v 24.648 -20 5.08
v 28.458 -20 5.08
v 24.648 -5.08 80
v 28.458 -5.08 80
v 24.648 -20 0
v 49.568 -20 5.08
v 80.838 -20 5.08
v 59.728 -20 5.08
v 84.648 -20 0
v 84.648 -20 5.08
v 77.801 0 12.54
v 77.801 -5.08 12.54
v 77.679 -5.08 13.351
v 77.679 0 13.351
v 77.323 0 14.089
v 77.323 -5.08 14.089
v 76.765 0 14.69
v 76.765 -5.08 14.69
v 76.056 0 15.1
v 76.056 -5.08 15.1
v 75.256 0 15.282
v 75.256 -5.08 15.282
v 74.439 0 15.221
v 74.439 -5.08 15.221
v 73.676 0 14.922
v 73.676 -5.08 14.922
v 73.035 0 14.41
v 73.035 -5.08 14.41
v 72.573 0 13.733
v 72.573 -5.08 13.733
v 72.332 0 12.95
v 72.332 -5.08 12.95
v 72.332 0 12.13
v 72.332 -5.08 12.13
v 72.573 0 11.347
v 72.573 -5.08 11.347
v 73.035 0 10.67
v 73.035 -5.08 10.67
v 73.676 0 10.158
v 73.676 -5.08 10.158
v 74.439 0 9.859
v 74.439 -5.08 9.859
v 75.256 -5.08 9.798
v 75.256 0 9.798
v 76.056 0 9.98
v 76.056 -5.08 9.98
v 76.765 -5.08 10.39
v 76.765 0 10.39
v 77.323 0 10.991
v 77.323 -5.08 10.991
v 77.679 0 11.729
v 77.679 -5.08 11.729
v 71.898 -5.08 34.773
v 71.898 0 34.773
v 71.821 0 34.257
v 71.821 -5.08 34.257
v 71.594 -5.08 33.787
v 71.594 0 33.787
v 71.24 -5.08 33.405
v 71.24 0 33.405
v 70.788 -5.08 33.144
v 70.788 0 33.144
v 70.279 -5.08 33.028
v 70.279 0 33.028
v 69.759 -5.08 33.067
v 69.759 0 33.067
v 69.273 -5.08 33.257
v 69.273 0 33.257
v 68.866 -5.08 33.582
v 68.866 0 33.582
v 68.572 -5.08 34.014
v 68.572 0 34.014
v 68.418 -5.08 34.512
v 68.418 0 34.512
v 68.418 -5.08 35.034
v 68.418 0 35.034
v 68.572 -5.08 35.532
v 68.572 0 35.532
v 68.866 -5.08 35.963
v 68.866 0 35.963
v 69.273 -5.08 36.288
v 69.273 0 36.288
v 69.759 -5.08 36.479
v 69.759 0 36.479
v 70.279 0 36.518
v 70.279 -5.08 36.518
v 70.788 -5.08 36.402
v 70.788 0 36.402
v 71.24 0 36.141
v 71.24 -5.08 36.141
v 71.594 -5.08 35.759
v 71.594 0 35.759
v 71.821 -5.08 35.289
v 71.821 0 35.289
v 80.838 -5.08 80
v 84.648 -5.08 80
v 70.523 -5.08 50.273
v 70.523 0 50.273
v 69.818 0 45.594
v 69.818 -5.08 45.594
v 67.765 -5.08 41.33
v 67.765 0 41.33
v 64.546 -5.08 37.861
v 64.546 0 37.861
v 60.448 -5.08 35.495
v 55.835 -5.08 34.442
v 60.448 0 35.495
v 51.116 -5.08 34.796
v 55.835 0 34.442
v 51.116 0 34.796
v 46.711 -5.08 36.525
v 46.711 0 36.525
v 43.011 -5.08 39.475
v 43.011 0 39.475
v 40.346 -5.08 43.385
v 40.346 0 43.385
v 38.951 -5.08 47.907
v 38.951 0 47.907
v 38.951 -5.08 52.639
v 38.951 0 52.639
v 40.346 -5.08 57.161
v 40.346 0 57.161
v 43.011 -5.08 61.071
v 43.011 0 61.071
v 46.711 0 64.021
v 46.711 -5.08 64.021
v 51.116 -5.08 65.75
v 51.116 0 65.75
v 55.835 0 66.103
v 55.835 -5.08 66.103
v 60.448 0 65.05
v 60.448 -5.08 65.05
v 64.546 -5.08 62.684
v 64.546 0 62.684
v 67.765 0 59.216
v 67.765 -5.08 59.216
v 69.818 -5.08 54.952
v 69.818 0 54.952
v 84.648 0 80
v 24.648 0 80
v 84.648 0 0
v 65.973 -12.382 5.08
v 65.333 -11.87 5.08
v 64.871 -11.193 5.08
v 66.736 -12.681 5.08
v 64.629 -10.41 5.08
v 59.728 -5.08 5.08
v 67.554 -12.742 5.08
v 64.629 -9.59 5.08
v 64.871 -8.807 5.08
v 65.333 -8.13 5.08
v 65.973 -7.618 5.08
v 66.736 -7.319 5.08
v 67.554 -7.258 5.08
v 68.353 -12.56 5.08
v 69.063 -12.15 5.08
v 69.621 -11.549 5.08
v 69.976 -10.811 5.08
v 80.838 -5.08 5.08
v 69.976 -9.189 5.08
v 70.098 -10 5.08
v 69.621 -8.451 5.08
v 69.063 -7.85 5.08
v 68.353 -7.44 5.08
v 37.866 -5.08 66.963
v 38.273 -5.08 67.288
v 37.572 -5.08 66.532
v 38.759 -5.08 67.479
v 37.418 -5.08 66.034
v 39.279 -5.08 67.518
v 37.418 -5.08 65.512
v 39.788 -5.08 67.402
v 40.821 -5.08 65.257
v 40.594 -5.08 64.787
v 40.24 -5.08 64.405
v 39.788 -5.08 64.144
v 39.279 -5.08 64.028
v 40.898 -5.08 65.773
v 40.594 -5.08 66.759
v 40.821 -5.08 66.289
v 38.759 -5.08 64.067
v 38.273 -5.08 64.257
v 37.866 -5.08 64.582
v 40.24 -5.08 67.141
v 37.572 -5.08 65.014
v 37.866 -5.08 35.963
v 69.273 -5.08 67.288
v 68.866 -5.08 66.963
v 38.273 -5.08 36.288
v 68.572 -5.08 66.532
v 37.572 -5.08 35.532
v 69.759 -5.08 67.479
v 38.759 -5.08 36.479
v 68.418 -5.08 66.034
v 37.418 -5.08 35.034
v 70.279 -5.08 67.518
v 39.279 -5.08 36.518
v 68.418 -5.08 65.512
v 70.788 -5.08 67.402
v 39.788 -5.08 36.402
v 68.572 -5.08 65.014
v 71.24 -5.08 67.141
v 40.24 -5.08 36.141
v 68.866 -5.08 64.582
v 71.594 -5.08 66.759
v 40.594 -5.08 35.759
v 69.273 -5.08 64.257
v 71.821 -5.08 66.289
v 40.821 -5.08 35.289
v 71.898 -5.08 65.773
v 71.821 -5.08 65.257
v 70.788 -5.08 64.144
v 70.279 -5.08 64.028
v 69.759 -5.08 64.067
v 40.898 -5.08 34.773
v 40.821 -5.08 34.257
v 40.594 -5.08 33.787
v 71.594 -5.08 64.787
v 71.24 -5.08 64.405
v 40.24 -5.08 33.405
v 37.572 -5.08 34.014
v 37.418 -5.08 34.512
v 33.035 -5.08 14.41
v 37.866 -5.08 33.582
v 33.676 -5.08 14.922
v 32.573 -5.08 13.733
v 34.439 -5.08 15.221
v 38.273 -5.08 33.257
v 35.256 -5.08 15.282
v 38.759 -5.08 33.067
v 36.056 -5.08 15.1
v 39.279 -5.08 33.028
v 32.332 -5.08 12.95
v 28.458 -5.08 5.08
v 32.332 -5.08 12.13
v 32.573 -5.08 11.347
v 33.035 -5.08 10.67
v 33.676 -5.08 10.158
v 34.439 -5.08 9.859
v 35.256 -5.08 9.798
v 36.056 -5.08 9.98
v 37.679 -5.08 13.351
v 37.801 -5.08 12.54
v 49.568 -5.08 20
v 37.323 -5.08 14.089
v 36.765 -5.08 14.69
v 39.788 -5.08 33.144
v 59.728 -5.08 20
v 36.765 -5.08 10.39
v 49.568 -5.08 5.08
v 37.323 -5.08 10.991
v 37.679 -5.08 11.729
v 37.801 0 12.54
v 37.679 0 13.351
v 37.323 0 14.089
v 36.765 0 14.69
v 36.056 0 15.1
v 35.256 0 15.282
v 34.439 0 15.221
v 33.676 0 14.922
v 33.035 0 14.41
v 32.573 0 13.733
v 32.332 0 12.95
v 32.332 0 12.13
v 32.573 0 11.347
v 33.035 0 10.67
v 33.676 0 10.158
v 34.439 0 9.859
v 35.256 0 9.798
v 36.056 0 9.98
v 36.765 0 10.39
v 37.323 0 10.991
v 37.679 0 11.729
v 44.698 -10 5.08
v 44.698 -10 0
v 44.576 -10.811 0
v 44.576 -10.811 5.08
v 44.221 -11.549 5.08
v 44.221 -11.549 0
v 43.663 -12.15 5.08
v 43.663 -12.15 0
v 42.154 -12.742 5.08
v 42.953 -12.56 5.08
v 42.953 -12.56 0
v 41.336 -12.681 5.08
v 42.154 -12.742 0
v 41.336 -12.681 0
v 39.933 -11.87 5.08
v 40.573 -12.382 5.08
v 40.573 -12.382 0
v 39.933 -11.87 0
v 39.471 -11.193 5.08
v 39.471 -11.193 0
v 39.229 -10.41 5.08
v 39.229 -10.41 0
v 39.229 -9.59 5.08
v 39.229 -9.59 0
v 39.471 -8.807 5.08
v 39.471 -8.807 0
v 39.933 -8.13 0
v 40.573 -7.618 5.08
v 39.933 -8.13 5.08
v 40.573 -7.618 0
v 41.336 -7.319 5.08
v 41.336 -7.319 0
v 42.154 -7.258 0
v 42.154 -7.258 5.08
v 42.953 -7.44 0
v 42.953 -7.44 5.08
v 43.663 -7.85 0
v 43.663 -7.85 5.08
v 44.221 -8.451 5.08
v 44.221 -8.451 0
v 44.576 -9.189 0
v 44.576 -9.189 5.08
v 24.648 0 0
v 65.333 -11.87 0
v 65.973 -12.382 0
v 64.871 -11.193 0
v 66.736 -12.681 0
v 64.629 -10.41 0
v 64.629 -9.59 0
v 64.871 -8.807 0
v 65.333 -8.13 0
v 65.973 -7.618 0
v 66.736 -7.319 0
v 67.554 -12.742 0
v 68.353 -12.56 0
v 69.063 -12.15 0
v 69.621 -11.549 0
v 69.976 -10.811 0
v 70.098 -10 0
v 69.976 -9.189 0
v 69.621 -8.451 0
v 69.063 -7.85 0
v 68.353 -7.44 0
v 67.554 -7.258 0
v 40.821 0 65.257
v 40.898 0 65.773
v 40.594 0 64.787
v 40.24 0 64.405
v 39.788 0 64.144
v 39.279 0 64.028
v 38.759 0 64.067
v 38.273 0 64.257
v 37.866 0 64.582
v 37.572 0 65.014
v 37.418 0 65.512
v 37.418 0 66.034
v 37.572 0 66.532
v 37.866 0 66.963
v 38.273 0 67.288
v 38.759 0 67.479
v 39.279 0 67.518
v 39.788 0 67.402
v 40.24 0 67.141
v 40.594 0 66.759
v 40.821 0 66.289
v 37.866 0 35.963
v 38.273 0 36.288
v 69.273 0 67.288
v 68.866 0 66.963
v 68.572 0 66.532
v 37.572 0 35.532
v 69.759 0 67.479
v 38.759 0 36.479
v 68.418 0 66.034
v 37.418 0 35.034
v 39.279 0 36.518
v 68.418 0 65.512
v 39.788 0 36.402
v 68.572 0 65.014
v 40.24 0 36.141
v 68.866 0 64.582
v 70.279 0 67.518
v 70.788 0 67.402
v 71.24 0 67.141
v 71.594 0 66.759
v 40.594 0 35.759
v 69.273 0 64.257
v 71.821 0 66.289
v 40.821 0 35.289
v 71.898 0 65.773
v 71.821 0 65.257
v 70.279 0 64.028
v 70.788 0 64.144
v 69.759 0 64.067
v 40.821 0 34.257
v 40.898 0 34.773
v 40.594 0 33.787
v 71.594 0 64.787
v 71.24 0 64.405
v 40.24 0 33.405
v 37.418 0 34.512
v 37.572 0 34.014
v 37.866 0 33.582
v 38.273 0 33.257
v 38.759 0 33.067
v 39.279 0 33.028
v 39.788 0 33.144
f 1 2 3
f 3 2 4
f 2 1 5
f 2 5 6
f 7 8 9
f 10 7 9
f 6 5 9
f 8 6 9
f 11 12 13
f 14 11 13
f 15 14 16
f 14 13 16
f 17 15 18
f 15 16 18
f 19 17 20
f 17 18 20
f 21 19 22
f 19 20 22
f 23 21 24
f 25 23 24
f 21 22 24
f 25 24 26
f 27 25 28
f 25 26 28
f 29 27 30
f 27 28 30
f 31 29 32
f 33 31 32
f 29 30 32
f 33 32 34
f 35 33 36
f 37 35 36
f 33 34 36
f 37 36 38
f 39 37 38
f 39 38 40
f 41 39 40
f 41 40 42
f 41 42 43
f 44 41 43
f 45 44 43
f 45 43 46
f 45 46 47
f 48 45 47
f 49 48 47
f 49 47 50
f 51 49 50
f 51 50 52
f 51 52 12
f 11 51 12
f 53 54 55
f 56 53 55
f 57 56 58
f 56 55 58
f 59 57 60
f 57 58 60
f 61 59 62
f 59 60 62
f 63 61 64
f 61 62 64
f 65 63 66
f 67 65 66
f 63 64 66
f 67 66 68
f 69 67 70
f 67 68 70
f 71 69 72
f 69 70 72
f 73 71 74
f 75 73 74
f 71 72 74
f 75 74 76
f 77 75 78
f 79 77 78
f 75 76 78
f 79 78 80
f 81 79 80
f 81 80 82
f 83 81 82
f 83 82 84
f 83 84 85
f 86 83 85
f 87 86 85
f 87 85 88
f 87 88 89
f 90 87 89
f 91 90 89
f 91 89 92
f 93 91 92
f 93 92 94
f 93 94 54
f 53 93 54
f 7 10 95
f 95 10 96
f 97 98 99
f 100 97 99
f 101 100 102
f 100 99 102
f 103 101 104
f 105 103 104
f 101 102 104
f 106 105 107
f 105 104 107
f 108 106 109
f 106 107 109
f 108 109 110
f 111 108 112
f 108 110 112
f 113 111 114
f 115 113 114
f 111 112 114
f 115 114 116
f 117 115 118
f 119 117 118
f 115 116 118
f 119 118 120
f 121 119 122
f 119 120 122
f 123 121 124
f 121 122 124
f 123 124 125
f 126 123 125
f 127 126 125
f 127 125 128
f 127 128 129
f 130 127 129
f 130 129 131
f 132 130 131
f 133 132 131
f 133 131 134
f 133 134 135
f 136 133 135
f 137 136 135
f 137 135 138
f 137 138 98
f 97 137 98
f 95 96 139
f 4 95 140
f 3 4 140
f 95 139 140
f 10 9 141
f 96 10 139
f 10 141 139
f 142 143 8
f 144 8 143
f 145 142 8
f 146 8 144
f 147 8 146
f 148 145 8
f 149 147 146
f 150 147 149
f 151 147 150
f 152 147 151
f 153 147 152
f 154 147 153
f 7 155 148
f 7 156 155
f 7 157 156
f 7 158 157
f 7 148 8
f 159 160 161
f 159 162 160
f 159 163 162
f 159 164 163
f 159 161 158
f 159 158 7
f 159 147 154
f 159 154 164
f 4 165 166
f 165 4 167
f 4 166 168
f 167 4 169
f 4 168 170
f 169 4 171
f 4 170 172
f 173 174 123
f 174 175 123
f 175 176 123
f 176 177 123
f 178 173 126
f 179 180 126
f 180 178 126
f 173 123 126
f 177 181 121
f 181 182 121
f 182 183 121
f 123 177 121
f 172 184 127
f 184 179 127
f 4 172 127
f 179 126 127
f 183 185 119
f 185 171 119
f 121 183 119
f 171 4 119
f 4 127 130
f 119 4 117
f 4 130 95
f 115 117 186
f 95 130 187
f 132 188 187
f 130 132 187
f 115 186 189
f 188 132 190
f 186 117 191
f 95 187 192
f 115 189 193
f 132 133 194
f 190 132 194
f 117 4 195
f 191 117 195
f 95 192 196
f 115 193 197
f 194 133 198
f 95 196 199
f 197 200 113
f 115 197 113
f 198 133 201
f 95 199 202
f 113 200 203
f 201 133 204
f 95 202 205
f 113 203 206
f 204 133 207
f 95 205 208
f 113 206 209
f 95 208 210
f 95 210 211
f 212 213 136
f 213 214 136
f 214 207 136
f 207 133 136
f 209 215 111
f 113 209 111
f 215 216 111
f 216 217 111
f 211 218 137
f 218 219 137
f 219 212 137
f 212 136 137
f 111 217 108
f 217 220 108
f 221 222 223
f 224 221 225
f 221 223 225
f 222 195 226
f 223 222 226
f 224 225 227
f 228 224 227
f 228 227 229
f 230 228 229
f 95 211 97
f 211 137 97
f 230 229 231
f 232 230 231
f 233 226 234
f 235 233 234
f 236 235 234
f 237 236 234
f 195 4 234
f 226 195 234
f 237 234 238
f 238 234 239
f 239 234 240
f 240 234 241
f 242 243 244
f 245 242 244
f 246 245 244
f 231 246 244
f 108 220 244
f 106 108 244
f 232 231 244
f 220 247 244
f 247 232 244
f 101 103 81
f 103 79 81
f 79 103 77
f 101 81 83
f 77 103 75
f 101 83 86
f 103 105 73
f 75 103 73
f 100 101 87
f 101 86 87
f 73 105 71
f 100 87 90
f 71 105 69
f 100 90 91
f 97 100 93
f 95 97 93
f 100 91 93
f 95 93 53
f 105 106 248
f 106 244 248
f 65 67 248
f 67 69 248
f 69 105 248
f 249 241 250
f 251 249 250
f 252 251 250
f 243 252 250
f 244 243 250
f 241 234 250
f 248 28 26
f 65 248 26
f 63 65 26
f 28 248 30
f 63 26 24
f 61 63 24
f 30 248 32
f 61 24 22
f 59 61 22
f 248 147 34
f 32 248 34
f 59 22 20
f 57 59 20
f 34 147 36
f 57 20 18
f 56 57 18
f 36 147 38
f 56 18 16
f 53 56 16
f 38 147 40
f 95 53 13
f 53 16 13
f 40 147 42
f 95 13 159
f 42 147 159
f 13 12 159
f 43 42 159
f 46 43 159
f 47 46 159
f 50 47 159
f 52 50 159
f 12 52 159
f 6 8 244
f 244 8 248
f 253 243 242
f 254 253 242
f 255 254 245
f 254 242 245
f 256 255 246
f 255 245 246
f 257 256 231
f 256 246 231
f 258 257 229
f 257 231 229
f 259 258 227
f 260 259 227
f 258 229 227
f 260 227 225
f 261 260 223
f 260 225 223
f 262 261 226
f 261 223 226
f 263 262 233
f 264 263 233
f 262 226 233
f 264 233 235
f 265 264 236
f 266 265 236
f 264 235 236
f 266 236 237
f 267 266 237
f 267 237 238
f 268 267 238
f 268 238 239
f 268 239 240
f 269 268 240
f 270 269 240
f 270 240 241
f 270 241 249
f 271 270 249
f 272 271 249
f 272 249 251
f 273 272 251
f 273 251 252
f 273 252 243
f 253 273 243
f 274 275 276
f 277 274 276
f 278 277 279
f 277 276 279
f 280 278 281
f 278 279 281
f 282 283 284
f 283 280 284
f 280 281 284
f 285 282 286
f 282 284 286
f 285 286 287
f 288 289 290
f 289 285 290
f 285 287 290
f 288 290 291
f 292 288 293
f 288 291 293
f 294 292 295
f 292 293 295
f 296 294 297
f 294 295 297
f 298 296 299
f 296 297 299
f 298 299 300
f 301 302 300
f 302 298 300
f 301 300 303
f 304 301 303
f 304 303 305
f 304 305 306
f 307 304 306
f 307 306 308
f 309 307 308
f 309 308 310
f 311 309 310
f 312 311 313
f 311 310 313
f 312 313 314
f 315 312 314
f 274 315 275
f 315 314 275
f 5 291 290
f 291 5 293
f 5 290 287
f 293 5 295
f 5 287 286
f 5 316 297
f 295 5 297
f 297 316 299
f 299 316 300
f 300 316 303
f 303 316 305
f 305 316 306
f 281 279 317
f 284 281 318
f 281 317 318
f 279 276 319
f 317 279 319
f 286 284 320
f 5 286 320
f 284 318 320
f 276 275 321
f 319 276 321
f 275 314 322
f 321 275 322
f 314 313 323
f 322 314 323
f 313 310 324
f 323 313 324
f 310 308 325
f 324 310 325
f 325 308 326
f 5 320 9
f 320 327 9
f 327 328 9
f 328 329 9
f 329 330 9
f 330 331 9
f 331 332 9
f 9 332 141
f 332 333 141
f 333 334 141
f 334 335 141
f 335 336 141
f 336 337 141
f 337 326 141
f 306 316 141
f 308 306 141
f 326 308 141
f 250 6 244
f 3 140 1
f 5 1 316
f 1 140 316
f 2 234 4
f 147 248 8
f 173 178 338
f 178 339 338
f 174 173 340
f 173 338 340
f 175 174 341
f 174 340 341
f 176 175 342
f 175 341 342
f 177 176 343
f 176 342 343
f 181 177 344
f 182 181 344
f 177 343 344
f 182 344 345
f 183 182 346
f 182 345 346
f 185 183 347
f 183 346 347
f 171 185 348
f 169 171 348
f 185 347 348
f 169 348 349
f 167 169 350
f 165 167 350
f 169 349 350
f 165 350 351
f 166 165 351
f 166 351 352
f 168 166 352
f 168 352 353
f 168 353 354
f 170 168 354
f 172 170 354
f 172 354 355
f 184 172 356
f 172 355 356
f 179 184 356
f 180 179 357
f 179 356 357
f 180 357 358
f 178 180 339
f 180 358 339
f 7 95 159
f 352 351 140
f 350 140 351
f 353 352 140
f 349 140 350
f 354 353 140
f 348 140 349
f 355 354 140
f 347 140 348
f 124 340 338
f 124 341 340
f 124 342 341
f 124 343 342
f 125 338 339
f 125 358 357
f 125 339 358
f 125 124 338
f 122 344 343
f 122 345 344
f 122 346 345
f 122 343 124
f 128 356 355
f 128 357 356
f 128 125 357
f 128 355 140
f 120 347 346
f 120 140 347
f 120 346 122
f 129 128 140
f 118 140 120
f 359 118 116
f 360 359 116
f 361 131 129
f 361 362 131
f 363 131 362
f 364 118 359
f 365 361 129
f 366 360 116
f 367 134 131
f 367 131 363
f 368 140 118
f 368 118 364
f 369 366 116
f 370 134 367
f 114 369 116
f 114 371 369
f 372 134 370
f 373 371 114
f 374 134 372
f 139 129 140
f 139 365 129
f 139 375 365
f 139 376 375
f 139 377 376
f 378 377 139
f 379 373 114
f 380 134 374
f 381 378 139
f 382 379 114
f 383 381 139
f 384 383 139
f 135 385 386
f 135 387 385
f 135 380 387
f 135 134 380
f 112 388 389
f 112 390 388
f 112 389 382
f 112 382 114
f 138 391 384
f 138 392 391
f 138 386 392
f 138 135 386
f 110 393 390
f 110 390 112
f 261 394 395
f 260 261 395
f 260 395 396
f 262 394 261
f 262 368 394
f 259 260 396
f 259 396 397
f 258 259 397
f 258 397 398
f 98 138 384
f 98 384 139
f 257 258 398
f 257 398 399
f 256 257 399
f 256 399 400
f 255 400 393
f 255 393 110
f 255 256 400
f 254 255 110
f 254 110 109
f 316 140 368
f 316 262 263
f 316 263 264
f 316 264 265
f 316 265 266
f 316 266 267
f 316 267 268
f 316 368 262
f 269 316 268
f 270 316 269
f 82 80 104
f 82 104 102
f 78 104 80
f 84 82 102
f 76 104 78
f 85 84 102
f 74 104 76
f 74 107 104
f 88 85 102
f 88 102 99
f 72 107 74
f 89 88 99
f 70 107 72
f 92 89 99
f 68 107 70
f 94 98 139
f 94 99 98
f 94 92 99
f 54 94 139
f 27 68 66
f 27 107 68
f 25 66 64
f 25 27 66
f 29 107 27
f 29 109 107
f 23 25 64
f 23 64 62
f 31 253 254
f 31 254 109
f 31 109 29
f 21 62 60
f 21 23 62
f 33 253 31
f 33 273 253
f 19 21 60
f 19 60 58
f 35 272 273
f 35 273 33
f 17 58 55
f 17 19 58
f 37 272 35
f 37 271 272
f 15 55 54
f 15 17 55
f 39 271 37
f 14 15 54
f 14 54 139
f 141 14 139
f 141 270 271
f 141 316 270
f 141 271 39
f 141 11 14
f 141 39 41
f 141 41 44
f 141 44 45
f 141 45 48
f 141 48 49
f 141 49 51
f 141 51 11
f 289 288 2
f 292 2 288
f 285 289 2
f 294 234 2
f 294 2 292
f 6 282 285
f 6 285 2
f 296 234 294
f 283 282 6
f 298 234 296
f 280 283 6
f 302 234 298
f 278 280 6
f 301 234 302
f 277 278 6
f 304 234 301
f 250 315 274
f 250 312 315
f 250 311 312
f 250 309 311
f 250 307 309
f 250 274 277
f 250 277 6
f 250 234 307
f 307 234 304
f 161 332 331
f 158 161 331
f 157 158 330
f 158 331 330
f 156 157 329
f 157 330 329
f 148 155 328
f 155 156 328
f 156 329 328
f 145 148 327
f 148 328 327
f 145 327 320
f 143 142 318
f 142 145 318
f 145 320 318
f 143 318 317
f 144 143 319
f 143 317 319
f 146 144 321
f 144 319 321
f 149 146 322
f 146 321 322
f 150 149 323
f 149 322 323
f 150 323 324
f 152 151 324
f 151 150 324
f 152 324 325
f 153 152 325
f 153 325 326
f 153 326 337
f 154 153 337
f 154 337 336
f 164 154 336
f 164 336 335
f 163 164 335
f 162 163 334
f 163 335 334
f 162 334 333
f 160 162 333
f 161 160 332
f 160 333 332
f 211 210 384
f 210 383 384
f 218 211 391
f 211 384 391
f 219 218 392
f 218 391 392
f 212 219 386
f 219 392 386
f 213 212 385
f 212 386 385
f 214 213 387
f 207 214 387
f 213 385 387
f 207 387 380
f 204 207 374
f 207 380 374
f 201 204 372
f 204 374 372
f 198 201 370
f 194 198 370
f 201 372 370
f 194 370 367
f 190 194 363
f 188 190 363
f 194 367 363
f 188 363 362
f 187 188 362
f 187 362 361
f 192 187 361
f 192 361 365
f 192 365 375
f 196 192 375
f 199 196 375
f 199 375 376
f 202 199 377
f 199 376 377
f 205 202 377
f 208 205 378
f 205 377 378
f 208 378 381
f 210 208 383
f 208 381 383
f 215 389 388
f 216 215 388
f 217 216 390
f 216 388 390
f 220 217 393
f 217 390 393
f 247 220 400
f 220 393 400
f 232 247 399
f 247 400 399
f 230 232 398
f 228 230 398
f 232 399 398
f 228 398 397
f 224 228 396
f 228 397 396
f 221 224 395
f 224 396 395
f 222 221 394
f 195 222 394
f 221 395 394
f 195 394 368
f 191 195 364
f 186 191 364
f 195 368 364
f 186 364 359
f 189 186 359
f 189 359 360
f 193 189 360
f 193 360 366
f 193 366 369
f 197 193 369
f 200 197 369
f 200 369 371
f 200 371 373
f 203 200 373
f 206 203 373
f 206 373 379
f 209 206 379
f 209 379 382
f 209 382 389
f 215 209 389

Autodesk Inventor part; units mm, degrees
ref_plane "YZ Plane" through (0, 0, 0) normal (1, 0, 0) x (0, 1, 0)
ref_plane "XZ Plane" through (0, 0, 0) normal (0, 1, 0) x (-1, 0, 0)
ref_plane "XY Plane" through (0, 0, 0) normal (0, 0, 1) x (1, 0, 0)
sketch "Sketch1" plane through (0, 0, 0) normal (0, 0, 1) x (1, 0, 0)
  line L0 (0, -1.25) -> (250, -1.25) construction
  line L1 (0, -1.25) -> (0, -6.4) projected
  line L2 (0, -6.4) -> (250, -6.4) construction
  line L3 (250, -1.25) -> (250, -6.4) projected
  line L4 (250, -18.75) -> (0, -18.75) construction
  line L5 (250, -13.6) -> (250, -18.75) projected
  line L6 (0, -13.6) -> (250, -13.6) construction
  line L7 (0, -13.6) -> (0, -18.75) projected
  line L8 (0, -20) -> (250, -20) construction
  line L9 (250, 0) -> (0, 0) construction
  line L10 (24.6484, -20) -> (84.6484, -20)
  line L11 (84.6484, -20) -> (84.6484, 0)
  line L12 (84.6484, 0) -> (24.6484, 0)
  line L13 (24.6484, 0) -> (24.6484, -20)
  line L14 (54.6484, -20) -> (54.6484, 0) construction
  circle A0 centre (67.3484, -10) radius 2.75
  circle A1 centre (41.9484, -10) radius 2.75
  line L15 (54.6484, -10) -> (41.9484, -10) construction
  line L16 (54.6484, -10) -> (67.3484, -10) construction
  point P0 (0, 0)
  dimension "d0" = 60
  dimension "d1" = 5.5
  dimension "d2" = 5.5
  dimension "d11" = 12.7
extrude "Extrusion1" add sketch "Sketch1" along normal blind 5.08
sketch "Sketch2" plane through (0, 0, 5.08) normal (0, 0, 1) x (1, 0, 0)
  line L0 (84.6484, 0) -> (24.6484, 0) projected
  line L1 (84.6484, -20) -> (84.6484, 0) projected
  line L2 (24.6484, 0) -> (84.6484, 0)
  line L3 (84.6484, 0) -> (84.6484, -5.08)
  line L4 (84.6484, -5.08) -> (24.6484, -5.08)
  line L5 (24.6484, -5.08) -> (24.6484, 0)
  point P0 (0, 0)
  dimension "d5" = 5.08
extrude "Extrusion2" add sketch "Sketch2" along normal blind 14.92
sketch "Sketch3" plane through (24.6484, -5.08, 5.08) normal (0, -1, 0) x (1, 0, 0)
  line L0 (0, -5.08) -> (0, 14.92) projected
  line L1 (0, 0) -> (60, 0) projected
  line L2 (0, 14.92) -> (0, 0)
  line L3 (60, -5.08) -> (60, 14.92) projected
  line L4 (19.1525, 952.0343) -> (19.1525, -47.9657) construction
  line L5 (19.1525, 952.0343) -> (14.0025, 952.0343) projected
  line L6 (14.0025, 952.0343) -> (14.0025, -47.9657) construction
  line L7 (19.1525, -47.9657) -> (14.0025, -47.9657) projected
  line L8 (1.6525, -47.9657) -> (1.6525, 952.0343) construction
  line L9 (6.8025, -47.9657) -> (1.6525, -47.9657) projected
  line L10 (6.8025, 952.0343) -> (6.8025, -47.9657) construction
  line L11 (6.8025, 952.0343) -> (1.6525, 952.0343) projected
  line L12 (0, 7.46) -> (1.6525, 7.46)
  line L13 (6.8025, 7.46) -> (14.0025, 7.46) construction
  line L14 (41.6525, -47.9657) -> (41.6525, 952.0343) construction
  line L15 (41.6525, -47.9657) -> (46.8025, -47.9657) projected
  line L16 (46.8025, -47.9657) -> (46.8025, 952.0343) construction
  line L17 (41.6525, 952.0343) -> (46.8025, 952.0343) projected
  line L18 (59.1525, 952.0343) -> (59.1525, -47.9657) construction
  line L19 (54.0025, 952.0343) -> (59.1525, 952.0343) projected
  line L20 (54.0025, -47.9657) -> (54.0025, 952.0343) construction
  line L21 (54.0025, -47.9657) -> (59.1525, -47.9657) projected
  line L22 (46.8025, 7.46) -> (54.0025, 7.46) construction
  line L23 (59.1525, 7.46) -> (60, 7.46)
  circle A0 centre (50.4025, 7.46) radius 2.75
  circle A1 centre (10.4025, 7.46) radius 2.75
  point P0 (-24.6484, -5.08)
  dimension "d8" = 5.5
extrude "Extrusion3" cut sketch "Sketch3" against normal blind 14.92
sketch "Sketch4" plane through (84.6484, -20, 0) normal (1, 0, 0) x (0, 0, -1)
  line L0 (-5.08, 0) -> (-5.08, 14.92) projected
  line L1 (-5.08, 14.92) -> (-20, 14.92) projected
  line L2 (-5.08, 0) -> (-20, 14.92)
  line L3 (-20, 14.92) -> (-5.08, 14.92)
  line L4 (-5.08, 14.92) -> (-5.08, 0)
  point P0 (0, 20)
extrude "Extrusion4" add sketch "Sketch4" against normal up to surface (60 mm away)
sketch "Sketch5" plane through (0, 0, 20) normal (0, 0, 1) x (1, 0, 0)
  line L0 (32.3009, 0) -> (37.8009, 0) projected
  line L1 (72.3009, 0) -> (77.8009, 0) projected
  circle A0 centre (41.9484, -10) radius 2.75 projected
  circle A1 centre (67.3484, -10) radius 2.75 projected
  line L2 (84.6484, 0) -> (24.6484, 0) projected
  line L3 (54.6484, 0) -> (54.6484, -20)
  line L4 (24.6484, -20) -> (84.6484, -20) projected
  line L5 (59.7284, -20) -> (49.5684, -20)
  line L6 (49.5684, -20) -> (49.5684, 0)
  line L7 (49.5684, 0) -> (59.7284, 0)
  line L8 (59.7284, 0) -> (59.7284, -20)
  line L9 (59.7284, -20) -> (49.5684, 0) construction
  line L10 (49.5684, -20) -> (59.7284, 0) construction
  line L11 (84.6484, -20) -> (82.1084, -20)
  line L12 (82.1084, -20) -> (82.1084, 0)
  line L13 (82.1084, 0) -> (84.6484, 0)
  line L14 (84.6484, 0) -> (84.6484, -20)
  line L15 (24.6484, -20) -> (27.1884, -20)
  line L16 (27.1884, -20) -> (27.1884, 0)
  line L17 (27.1884, 0) -> (24.6484, 0)
  line L18 (24.6484, 0) -> (24.6484, -20)
  line L19 (24.6484, -5.08) -> (84.6484, -5.08) projected
  line L20 (84.6484, 0) -> (24.6484, 0)
  line L21 (24.6484, 0) -> (24.6484, -5.08)
  line L22 (24.6484, -5.08) -> (84.6484, -5.08)
  line L23 (84.6484, -5.08) -> (84.6484, 0)
  line L24 (59.7284, -20) -> (82.1084, -20)
  line L25 (82.1084, -20) -> (82.1084, -5.08)
  line L26 (82.1084, -5.08) -> (59.7284, -5.08)
  line L27 (59.7284, -5.08) -> (59.7284, -20)
  line L28 (27.1884, -20) -> (49.5684, -20)
  line L29 (49.5684, -20) -> (49.5684, -5.08)
  line L30 (49.5684, -5.08) -> (27.1884, -5.08)
  line L31 (27.1884, -5.08) -> (27.1884, -20)
  line L32 (49.5684, -5.08) -> (12.5322, -5.08)
  line L33 (12.5322, -5.08) -> (12.5322, -38.5786)
  line L34 (12.5322, -38.5786) -> (49.5684, -38.5786)
  line L35 (49.5684, -38.5786) -> (49.5684, -5.08)
  line L36 (59.7284, -5.08) -> (93.4749, -5.08)
  line L37 (93.4749, -5.08) -> (93.4749, -31.7372)
  line L38 (93.4749, -31.7372) -> (59.7284, -31.7372)
  line L39 (59.7284, -31.7372) -> (59.7284, -5.08)
  point P0 (0, 0)
  point P1 (54.6484, -10)
  dimension "d14" = 2.54
  dimension "d15" = 2.54
  dimension "d16" = 10.16
extrude "Extrusion5" cut sketch "Sketch5" against normal blind 14.92 contours L19 L6 L4 L16 | L16 L4 L18 L19 | L18 L4 L35 L34 L33 L32 | L19 L12 L4 L8 | L4 L14 L36 L37 L38 L39 | L19 L14 L4 L12 | A0 | A1
sketch "Sketch8" plane through (24.6484, 0, 0) normal (0, 1, 0) x (1, 0, 0)
  line L0 (60, 0) -> (0, 0) projected
  line L1 (30, 0) -> (30, -133.2692) construction
  line L2 (0, -20) -> (0, -5.08) projected
  line L3 (0, -20) -> (60, -20)
  line L4 (60, -20) -> (60, -80)
  line L5 (60, -80) -> (0, -80)
  line L6 (0, -80) -> (0, -20)
  circle A0 centre (30, -50.2728) radius 15.875
  line L7 (45.5, -65.7728) -> (14.5, -65.7728) construction
  line L8 (14.5, -65.7728) -> (14.5, -34.7728) construction
  line L9 (14.5, -34.7728) -> (45.5, -34.7728) construction
  line L10 (45.5, -34.7728) -> (45.5, -65.7728) construction
  line L11 (45.5, -65.7728) -> (14.5, -34.7728) construction
  line L12 (14.5, -65.7728) -> (45.5, -34.7728) construction
  circle A1 centre (14.5, -65.7728) radius 1.75
  circle A2 centre (14.5, -34.7728) radius 1.75
  circle A3 centre (45.5, -34.7728) radius 1.75
  circle A4 centre (45.5, -65.7728) radius 1.75
  point P0 (-24.6484, 0)
  dimension "d24" = 31
  dimension "d25" = 31.75
  dimension "d26" = 3.5
extrude "Extrusion8" add sketch "Sketch8" against normal up to surface (5.08 mm away)
sketch "Sketch10" plane through (24.6484, -5.08, 5.08) normal (0, -1, 0) x (1, 0, 0)
  line L0 (0, 0) -> (24.92, 0) projected
  line L1 (0, 0) -> (3.81, 0)
  line L2 (3.81, 0) -> (3.81, 74.92)
  line L3 (3.81, 74.92) -> (0, 74.92)
  line L4 (0, 74.92) -> (0, 0)
  line L5 (60, 74.92) -> (60, 0) projected
  line L6 (35.08, 0) -> (60, 0) projected
  line L7 (60, 74.92) -> (56.19, 74.92)
  line L8 (56.19, 74.92) -> (56.19, 0)
  line L9 (56.19, 0) -> (60, 0)
  line L10 (60, 0) -> (60, 74.92)
  point P0 (-24.6484, -5.08)
  dimension "d29" = 3.81
extrude "Extrusion9" add sketch "Sketch10" along normal up to surface (14.92 mm away)
sketch "Sketch11" plane through (84.6484, -20, 0) normal (1, 0, 0) x (0, 0, -1)
  line L0 (-80, 0) -> (-5.08, 0) projected
  line L1 (-5.08, 14.92) -> (-5.08, 0) projected
  line L2 (-80, 14.92) -> (-5.08, 14.92) projected
  line L3 (-80, 14.92) -> (-80, 0) projected
  line L4 (-5.08, 0) -> (-80, 14.92)
  point P0 (0, 20)
extrude "Extrusion10" cut sketch "Sketch11" against normal through all contours L3 L4 L0
properties part number "double90andMotor"
